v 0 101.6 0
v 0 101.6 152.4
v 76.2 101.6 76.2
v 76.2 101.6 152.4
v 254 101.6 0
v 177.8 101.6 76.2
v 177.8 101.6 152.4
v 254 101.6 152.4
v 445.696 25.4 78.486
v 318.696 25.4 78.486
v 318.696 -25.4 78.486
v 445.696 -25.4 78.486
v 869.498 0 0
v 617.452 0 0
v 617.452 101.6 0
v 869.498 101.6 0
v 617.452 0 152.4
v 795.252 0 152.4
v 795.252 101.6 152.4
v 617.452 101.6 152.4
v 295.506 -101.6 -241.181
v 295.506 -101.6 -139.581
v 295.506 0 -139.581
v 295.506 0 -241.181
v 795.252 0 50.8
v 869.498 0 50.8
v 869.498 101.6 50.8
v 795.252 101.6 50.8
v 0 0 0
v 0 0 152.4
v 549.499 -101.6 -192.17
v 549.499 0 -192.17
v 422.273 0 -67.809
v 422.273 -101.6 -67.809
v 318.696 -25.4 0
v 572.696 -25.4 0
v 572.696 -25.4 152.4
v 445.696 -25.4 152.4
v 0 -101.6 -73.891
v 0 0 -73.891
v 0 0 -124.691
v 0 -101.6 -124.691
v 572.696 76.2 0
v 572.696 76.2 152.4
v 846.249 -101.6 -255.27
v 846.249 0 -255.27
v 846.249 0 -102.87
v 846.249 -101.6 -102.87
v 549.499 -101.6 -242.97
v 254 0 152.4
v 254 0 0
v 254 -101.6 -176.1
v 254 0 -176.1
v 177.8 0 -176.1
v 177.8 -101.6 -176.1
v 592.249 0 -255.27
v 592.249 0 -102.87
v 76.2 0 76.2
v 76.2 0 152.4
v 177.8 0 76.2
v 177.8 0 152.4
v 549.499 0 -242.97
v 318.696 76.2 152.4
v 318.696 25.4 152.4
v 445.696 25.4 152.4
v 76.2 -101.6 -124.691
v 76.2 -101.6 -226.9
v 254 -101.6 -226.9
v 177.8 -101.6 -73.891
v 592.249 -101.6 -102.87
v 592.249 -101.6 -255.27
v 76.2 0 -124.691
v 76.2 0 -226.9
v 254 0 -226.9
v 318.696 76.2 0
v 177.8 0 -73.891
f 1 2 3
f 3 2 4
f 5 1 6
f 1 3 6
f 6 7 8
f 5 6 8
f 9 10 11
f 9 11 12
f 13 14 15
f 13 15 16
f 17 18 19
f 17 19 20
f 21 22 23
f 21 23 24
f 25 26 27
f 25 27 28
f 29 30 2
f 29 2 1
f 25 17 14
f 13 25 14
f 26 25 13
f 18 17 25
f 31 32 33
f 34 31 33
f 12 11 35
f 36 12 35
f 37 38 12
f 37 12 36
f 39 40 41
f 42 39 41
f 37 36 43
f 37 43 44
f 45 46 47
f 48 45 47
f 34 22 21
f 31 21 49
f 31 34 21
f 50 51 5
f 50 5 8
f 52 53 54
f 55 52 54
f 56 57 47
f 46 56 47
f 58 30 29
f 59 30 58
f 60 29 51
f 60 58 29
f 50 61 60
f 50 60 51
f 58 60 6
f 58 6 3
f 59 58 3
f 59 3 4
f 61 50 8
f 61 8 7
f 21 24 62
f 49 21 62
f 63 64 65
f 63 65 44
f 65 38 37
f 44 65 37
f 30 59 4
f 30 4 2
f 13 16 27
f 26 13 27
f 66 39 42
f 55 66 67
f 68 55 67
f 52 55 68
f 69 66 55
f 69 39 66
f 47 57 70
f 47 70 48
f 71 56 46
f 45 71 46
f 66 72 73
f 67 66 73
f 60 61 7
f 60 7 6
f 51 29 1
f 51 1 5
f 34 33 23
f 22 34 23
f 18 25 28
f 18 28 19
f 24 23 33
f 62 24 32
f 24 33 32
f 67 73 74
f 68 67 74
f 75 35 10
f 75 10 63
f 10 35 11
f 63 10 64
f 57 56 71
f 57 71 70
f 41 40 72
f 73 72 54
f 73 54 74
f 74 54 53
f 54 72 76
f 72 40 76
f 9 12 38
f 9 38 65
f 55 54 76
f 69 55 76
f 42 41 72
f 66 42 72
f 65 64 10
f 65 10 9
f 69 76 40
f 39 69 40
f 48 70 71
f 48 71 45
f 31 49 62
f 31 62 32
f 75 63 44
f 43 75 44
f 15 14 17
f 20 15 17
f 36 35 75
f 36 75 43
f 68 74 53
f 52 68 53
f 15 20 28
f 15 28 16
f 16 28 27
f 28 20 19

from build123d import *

# Parameters (mm, degrees)
F1_DEPTH  = 101.6
F2_W      = 254
F2_H      = 152.4
F3_DEPTH  = 25.4
F4_DEPTH  = 25.4
F5_DEPTH  = 101.6
F6_W      = 127
F6_H      = 50.8
F7_DEPTH  = 73.914
F8_W      = 50.8
F8_H      = 152.4
F9_DEPTH  = 101.6
F11_DEPTH = 101.6
F13_DEPTH = 101.6
F14_W     = 254
F14_H     = 152.4
F14_W_2   = 203.2
F14_H_2   = 101.6
F15_DEPTH = 101.6


with BuildPart() as f1:
    # F0 (on Front) → F1 (new body)
    with BuildSketch(Plane.XZ):
        Polygon((0, 152.4), (0, 0), (254, 0), (254, 152.4), (177.8, 152.4), (177.8, 76.2), (76.2, 76.2), (76.2, 152.4), align=None)
    extrude(amount=-F1_DEPTH)


with BuildPart() as f3:
    # F2 (on Front) → F3 (new body)
    with BuildSketch(Plane.XZ):
        with Locations((445.69599095, 76.2)):
            Rectangle(F2_W, F2_H)
    extrude(amount=F3_DEPTH)

    # F4 (add): a face of the model
    f4_faces = [f3.faces().sort_by_distance(p)[0] for p in [
        (445.69599095, -12.7, 152.4),
    ]]
    extrude(f4_faces, amount=-F4_DEPTH)

    # F5 (add): a face of the model
    f5_faces = [f3.faces().sort_by_distance(p)[0] for p in [
        (445.69599095, -25.4, 76.2),
    ]]
    extrude(f5_faces, amount=-F5_DEPTH)

    # F6 (on face) → F7 (cut)
    with BuildSketch(Plane.XY.offset(152.4)):
        with Locations((382.19599095, 0)):
            Rectangle(F6_W, F6_H)
    extrude(amount=-F7_DEPTH, mode=Mode.SUBTRACT)


with BuildPart() as f9:
    # F8 (on Front) → F9 (new body)
    with BuildSketch(Plane.XZ):
        Polygon((668.2515941393, 152.4), (668.2515941393, 0), (869.4976955753, 0), (869.4976955753, 50.8), (795.2515941393, 50.8), (795.2515941393, 152.4), align=None)
        with Locations((642.8515941393, 76.2)):
            Rectangle(F8_W, F8_H)
    extrude(amount=-F9_DEPTH)


with BuildPart() as f11:
    # F10 (on Front) → F11 (new body)
    with BuildSketch(Plane.XZ):
        Polygon((177.8, -73.8908549448), (0, -73.8908549448), (0, -124.6908549448), (76.2, -124.6908549448), (76.2, -226.9003139168), (254, -226.9003139168), (254, -176.1003139168), (177.8, -176.1003139168), align=None)
    extrude(amount=F11_DEPTH)


with BuildPart() as f13:
    # F12 (on Front) → F13 (new body)
    with BuildSketch(Plane.XZ):
        Polygon((295.5057420384, -139.5811057088), (295.5057420384, -241.1811057088), (549.4994439671, -242.9697869319), (549.4994439671, -192.1697869319), (422.2727364604, -67.8086321592), align=None)
    extrude(amount=F13_DEPTH)


with BuildPart() as f15:
    # F14 (on Front) → F15 (new body)
    with BuildSketch(Plane.XZ):
        with Locations((719.2486805237, -179.0699698031)):
            Rectangle(F14_W, F14_H)
        with Locations((719.2486805237, -179.0699698031)):
            Rectangle(F14_W_2, F14_H_2, mode=Mode.SUBTRACT)
        with Locations((719.2486805237, -179.0699698031)):
            Rectangle(F14_W_2, F14_H_2)
    extrude(amount=F15_DEPTH)


solid = Compound([f1.part, f3.part, f9.part, f11.part, f13.part, f15.part])
